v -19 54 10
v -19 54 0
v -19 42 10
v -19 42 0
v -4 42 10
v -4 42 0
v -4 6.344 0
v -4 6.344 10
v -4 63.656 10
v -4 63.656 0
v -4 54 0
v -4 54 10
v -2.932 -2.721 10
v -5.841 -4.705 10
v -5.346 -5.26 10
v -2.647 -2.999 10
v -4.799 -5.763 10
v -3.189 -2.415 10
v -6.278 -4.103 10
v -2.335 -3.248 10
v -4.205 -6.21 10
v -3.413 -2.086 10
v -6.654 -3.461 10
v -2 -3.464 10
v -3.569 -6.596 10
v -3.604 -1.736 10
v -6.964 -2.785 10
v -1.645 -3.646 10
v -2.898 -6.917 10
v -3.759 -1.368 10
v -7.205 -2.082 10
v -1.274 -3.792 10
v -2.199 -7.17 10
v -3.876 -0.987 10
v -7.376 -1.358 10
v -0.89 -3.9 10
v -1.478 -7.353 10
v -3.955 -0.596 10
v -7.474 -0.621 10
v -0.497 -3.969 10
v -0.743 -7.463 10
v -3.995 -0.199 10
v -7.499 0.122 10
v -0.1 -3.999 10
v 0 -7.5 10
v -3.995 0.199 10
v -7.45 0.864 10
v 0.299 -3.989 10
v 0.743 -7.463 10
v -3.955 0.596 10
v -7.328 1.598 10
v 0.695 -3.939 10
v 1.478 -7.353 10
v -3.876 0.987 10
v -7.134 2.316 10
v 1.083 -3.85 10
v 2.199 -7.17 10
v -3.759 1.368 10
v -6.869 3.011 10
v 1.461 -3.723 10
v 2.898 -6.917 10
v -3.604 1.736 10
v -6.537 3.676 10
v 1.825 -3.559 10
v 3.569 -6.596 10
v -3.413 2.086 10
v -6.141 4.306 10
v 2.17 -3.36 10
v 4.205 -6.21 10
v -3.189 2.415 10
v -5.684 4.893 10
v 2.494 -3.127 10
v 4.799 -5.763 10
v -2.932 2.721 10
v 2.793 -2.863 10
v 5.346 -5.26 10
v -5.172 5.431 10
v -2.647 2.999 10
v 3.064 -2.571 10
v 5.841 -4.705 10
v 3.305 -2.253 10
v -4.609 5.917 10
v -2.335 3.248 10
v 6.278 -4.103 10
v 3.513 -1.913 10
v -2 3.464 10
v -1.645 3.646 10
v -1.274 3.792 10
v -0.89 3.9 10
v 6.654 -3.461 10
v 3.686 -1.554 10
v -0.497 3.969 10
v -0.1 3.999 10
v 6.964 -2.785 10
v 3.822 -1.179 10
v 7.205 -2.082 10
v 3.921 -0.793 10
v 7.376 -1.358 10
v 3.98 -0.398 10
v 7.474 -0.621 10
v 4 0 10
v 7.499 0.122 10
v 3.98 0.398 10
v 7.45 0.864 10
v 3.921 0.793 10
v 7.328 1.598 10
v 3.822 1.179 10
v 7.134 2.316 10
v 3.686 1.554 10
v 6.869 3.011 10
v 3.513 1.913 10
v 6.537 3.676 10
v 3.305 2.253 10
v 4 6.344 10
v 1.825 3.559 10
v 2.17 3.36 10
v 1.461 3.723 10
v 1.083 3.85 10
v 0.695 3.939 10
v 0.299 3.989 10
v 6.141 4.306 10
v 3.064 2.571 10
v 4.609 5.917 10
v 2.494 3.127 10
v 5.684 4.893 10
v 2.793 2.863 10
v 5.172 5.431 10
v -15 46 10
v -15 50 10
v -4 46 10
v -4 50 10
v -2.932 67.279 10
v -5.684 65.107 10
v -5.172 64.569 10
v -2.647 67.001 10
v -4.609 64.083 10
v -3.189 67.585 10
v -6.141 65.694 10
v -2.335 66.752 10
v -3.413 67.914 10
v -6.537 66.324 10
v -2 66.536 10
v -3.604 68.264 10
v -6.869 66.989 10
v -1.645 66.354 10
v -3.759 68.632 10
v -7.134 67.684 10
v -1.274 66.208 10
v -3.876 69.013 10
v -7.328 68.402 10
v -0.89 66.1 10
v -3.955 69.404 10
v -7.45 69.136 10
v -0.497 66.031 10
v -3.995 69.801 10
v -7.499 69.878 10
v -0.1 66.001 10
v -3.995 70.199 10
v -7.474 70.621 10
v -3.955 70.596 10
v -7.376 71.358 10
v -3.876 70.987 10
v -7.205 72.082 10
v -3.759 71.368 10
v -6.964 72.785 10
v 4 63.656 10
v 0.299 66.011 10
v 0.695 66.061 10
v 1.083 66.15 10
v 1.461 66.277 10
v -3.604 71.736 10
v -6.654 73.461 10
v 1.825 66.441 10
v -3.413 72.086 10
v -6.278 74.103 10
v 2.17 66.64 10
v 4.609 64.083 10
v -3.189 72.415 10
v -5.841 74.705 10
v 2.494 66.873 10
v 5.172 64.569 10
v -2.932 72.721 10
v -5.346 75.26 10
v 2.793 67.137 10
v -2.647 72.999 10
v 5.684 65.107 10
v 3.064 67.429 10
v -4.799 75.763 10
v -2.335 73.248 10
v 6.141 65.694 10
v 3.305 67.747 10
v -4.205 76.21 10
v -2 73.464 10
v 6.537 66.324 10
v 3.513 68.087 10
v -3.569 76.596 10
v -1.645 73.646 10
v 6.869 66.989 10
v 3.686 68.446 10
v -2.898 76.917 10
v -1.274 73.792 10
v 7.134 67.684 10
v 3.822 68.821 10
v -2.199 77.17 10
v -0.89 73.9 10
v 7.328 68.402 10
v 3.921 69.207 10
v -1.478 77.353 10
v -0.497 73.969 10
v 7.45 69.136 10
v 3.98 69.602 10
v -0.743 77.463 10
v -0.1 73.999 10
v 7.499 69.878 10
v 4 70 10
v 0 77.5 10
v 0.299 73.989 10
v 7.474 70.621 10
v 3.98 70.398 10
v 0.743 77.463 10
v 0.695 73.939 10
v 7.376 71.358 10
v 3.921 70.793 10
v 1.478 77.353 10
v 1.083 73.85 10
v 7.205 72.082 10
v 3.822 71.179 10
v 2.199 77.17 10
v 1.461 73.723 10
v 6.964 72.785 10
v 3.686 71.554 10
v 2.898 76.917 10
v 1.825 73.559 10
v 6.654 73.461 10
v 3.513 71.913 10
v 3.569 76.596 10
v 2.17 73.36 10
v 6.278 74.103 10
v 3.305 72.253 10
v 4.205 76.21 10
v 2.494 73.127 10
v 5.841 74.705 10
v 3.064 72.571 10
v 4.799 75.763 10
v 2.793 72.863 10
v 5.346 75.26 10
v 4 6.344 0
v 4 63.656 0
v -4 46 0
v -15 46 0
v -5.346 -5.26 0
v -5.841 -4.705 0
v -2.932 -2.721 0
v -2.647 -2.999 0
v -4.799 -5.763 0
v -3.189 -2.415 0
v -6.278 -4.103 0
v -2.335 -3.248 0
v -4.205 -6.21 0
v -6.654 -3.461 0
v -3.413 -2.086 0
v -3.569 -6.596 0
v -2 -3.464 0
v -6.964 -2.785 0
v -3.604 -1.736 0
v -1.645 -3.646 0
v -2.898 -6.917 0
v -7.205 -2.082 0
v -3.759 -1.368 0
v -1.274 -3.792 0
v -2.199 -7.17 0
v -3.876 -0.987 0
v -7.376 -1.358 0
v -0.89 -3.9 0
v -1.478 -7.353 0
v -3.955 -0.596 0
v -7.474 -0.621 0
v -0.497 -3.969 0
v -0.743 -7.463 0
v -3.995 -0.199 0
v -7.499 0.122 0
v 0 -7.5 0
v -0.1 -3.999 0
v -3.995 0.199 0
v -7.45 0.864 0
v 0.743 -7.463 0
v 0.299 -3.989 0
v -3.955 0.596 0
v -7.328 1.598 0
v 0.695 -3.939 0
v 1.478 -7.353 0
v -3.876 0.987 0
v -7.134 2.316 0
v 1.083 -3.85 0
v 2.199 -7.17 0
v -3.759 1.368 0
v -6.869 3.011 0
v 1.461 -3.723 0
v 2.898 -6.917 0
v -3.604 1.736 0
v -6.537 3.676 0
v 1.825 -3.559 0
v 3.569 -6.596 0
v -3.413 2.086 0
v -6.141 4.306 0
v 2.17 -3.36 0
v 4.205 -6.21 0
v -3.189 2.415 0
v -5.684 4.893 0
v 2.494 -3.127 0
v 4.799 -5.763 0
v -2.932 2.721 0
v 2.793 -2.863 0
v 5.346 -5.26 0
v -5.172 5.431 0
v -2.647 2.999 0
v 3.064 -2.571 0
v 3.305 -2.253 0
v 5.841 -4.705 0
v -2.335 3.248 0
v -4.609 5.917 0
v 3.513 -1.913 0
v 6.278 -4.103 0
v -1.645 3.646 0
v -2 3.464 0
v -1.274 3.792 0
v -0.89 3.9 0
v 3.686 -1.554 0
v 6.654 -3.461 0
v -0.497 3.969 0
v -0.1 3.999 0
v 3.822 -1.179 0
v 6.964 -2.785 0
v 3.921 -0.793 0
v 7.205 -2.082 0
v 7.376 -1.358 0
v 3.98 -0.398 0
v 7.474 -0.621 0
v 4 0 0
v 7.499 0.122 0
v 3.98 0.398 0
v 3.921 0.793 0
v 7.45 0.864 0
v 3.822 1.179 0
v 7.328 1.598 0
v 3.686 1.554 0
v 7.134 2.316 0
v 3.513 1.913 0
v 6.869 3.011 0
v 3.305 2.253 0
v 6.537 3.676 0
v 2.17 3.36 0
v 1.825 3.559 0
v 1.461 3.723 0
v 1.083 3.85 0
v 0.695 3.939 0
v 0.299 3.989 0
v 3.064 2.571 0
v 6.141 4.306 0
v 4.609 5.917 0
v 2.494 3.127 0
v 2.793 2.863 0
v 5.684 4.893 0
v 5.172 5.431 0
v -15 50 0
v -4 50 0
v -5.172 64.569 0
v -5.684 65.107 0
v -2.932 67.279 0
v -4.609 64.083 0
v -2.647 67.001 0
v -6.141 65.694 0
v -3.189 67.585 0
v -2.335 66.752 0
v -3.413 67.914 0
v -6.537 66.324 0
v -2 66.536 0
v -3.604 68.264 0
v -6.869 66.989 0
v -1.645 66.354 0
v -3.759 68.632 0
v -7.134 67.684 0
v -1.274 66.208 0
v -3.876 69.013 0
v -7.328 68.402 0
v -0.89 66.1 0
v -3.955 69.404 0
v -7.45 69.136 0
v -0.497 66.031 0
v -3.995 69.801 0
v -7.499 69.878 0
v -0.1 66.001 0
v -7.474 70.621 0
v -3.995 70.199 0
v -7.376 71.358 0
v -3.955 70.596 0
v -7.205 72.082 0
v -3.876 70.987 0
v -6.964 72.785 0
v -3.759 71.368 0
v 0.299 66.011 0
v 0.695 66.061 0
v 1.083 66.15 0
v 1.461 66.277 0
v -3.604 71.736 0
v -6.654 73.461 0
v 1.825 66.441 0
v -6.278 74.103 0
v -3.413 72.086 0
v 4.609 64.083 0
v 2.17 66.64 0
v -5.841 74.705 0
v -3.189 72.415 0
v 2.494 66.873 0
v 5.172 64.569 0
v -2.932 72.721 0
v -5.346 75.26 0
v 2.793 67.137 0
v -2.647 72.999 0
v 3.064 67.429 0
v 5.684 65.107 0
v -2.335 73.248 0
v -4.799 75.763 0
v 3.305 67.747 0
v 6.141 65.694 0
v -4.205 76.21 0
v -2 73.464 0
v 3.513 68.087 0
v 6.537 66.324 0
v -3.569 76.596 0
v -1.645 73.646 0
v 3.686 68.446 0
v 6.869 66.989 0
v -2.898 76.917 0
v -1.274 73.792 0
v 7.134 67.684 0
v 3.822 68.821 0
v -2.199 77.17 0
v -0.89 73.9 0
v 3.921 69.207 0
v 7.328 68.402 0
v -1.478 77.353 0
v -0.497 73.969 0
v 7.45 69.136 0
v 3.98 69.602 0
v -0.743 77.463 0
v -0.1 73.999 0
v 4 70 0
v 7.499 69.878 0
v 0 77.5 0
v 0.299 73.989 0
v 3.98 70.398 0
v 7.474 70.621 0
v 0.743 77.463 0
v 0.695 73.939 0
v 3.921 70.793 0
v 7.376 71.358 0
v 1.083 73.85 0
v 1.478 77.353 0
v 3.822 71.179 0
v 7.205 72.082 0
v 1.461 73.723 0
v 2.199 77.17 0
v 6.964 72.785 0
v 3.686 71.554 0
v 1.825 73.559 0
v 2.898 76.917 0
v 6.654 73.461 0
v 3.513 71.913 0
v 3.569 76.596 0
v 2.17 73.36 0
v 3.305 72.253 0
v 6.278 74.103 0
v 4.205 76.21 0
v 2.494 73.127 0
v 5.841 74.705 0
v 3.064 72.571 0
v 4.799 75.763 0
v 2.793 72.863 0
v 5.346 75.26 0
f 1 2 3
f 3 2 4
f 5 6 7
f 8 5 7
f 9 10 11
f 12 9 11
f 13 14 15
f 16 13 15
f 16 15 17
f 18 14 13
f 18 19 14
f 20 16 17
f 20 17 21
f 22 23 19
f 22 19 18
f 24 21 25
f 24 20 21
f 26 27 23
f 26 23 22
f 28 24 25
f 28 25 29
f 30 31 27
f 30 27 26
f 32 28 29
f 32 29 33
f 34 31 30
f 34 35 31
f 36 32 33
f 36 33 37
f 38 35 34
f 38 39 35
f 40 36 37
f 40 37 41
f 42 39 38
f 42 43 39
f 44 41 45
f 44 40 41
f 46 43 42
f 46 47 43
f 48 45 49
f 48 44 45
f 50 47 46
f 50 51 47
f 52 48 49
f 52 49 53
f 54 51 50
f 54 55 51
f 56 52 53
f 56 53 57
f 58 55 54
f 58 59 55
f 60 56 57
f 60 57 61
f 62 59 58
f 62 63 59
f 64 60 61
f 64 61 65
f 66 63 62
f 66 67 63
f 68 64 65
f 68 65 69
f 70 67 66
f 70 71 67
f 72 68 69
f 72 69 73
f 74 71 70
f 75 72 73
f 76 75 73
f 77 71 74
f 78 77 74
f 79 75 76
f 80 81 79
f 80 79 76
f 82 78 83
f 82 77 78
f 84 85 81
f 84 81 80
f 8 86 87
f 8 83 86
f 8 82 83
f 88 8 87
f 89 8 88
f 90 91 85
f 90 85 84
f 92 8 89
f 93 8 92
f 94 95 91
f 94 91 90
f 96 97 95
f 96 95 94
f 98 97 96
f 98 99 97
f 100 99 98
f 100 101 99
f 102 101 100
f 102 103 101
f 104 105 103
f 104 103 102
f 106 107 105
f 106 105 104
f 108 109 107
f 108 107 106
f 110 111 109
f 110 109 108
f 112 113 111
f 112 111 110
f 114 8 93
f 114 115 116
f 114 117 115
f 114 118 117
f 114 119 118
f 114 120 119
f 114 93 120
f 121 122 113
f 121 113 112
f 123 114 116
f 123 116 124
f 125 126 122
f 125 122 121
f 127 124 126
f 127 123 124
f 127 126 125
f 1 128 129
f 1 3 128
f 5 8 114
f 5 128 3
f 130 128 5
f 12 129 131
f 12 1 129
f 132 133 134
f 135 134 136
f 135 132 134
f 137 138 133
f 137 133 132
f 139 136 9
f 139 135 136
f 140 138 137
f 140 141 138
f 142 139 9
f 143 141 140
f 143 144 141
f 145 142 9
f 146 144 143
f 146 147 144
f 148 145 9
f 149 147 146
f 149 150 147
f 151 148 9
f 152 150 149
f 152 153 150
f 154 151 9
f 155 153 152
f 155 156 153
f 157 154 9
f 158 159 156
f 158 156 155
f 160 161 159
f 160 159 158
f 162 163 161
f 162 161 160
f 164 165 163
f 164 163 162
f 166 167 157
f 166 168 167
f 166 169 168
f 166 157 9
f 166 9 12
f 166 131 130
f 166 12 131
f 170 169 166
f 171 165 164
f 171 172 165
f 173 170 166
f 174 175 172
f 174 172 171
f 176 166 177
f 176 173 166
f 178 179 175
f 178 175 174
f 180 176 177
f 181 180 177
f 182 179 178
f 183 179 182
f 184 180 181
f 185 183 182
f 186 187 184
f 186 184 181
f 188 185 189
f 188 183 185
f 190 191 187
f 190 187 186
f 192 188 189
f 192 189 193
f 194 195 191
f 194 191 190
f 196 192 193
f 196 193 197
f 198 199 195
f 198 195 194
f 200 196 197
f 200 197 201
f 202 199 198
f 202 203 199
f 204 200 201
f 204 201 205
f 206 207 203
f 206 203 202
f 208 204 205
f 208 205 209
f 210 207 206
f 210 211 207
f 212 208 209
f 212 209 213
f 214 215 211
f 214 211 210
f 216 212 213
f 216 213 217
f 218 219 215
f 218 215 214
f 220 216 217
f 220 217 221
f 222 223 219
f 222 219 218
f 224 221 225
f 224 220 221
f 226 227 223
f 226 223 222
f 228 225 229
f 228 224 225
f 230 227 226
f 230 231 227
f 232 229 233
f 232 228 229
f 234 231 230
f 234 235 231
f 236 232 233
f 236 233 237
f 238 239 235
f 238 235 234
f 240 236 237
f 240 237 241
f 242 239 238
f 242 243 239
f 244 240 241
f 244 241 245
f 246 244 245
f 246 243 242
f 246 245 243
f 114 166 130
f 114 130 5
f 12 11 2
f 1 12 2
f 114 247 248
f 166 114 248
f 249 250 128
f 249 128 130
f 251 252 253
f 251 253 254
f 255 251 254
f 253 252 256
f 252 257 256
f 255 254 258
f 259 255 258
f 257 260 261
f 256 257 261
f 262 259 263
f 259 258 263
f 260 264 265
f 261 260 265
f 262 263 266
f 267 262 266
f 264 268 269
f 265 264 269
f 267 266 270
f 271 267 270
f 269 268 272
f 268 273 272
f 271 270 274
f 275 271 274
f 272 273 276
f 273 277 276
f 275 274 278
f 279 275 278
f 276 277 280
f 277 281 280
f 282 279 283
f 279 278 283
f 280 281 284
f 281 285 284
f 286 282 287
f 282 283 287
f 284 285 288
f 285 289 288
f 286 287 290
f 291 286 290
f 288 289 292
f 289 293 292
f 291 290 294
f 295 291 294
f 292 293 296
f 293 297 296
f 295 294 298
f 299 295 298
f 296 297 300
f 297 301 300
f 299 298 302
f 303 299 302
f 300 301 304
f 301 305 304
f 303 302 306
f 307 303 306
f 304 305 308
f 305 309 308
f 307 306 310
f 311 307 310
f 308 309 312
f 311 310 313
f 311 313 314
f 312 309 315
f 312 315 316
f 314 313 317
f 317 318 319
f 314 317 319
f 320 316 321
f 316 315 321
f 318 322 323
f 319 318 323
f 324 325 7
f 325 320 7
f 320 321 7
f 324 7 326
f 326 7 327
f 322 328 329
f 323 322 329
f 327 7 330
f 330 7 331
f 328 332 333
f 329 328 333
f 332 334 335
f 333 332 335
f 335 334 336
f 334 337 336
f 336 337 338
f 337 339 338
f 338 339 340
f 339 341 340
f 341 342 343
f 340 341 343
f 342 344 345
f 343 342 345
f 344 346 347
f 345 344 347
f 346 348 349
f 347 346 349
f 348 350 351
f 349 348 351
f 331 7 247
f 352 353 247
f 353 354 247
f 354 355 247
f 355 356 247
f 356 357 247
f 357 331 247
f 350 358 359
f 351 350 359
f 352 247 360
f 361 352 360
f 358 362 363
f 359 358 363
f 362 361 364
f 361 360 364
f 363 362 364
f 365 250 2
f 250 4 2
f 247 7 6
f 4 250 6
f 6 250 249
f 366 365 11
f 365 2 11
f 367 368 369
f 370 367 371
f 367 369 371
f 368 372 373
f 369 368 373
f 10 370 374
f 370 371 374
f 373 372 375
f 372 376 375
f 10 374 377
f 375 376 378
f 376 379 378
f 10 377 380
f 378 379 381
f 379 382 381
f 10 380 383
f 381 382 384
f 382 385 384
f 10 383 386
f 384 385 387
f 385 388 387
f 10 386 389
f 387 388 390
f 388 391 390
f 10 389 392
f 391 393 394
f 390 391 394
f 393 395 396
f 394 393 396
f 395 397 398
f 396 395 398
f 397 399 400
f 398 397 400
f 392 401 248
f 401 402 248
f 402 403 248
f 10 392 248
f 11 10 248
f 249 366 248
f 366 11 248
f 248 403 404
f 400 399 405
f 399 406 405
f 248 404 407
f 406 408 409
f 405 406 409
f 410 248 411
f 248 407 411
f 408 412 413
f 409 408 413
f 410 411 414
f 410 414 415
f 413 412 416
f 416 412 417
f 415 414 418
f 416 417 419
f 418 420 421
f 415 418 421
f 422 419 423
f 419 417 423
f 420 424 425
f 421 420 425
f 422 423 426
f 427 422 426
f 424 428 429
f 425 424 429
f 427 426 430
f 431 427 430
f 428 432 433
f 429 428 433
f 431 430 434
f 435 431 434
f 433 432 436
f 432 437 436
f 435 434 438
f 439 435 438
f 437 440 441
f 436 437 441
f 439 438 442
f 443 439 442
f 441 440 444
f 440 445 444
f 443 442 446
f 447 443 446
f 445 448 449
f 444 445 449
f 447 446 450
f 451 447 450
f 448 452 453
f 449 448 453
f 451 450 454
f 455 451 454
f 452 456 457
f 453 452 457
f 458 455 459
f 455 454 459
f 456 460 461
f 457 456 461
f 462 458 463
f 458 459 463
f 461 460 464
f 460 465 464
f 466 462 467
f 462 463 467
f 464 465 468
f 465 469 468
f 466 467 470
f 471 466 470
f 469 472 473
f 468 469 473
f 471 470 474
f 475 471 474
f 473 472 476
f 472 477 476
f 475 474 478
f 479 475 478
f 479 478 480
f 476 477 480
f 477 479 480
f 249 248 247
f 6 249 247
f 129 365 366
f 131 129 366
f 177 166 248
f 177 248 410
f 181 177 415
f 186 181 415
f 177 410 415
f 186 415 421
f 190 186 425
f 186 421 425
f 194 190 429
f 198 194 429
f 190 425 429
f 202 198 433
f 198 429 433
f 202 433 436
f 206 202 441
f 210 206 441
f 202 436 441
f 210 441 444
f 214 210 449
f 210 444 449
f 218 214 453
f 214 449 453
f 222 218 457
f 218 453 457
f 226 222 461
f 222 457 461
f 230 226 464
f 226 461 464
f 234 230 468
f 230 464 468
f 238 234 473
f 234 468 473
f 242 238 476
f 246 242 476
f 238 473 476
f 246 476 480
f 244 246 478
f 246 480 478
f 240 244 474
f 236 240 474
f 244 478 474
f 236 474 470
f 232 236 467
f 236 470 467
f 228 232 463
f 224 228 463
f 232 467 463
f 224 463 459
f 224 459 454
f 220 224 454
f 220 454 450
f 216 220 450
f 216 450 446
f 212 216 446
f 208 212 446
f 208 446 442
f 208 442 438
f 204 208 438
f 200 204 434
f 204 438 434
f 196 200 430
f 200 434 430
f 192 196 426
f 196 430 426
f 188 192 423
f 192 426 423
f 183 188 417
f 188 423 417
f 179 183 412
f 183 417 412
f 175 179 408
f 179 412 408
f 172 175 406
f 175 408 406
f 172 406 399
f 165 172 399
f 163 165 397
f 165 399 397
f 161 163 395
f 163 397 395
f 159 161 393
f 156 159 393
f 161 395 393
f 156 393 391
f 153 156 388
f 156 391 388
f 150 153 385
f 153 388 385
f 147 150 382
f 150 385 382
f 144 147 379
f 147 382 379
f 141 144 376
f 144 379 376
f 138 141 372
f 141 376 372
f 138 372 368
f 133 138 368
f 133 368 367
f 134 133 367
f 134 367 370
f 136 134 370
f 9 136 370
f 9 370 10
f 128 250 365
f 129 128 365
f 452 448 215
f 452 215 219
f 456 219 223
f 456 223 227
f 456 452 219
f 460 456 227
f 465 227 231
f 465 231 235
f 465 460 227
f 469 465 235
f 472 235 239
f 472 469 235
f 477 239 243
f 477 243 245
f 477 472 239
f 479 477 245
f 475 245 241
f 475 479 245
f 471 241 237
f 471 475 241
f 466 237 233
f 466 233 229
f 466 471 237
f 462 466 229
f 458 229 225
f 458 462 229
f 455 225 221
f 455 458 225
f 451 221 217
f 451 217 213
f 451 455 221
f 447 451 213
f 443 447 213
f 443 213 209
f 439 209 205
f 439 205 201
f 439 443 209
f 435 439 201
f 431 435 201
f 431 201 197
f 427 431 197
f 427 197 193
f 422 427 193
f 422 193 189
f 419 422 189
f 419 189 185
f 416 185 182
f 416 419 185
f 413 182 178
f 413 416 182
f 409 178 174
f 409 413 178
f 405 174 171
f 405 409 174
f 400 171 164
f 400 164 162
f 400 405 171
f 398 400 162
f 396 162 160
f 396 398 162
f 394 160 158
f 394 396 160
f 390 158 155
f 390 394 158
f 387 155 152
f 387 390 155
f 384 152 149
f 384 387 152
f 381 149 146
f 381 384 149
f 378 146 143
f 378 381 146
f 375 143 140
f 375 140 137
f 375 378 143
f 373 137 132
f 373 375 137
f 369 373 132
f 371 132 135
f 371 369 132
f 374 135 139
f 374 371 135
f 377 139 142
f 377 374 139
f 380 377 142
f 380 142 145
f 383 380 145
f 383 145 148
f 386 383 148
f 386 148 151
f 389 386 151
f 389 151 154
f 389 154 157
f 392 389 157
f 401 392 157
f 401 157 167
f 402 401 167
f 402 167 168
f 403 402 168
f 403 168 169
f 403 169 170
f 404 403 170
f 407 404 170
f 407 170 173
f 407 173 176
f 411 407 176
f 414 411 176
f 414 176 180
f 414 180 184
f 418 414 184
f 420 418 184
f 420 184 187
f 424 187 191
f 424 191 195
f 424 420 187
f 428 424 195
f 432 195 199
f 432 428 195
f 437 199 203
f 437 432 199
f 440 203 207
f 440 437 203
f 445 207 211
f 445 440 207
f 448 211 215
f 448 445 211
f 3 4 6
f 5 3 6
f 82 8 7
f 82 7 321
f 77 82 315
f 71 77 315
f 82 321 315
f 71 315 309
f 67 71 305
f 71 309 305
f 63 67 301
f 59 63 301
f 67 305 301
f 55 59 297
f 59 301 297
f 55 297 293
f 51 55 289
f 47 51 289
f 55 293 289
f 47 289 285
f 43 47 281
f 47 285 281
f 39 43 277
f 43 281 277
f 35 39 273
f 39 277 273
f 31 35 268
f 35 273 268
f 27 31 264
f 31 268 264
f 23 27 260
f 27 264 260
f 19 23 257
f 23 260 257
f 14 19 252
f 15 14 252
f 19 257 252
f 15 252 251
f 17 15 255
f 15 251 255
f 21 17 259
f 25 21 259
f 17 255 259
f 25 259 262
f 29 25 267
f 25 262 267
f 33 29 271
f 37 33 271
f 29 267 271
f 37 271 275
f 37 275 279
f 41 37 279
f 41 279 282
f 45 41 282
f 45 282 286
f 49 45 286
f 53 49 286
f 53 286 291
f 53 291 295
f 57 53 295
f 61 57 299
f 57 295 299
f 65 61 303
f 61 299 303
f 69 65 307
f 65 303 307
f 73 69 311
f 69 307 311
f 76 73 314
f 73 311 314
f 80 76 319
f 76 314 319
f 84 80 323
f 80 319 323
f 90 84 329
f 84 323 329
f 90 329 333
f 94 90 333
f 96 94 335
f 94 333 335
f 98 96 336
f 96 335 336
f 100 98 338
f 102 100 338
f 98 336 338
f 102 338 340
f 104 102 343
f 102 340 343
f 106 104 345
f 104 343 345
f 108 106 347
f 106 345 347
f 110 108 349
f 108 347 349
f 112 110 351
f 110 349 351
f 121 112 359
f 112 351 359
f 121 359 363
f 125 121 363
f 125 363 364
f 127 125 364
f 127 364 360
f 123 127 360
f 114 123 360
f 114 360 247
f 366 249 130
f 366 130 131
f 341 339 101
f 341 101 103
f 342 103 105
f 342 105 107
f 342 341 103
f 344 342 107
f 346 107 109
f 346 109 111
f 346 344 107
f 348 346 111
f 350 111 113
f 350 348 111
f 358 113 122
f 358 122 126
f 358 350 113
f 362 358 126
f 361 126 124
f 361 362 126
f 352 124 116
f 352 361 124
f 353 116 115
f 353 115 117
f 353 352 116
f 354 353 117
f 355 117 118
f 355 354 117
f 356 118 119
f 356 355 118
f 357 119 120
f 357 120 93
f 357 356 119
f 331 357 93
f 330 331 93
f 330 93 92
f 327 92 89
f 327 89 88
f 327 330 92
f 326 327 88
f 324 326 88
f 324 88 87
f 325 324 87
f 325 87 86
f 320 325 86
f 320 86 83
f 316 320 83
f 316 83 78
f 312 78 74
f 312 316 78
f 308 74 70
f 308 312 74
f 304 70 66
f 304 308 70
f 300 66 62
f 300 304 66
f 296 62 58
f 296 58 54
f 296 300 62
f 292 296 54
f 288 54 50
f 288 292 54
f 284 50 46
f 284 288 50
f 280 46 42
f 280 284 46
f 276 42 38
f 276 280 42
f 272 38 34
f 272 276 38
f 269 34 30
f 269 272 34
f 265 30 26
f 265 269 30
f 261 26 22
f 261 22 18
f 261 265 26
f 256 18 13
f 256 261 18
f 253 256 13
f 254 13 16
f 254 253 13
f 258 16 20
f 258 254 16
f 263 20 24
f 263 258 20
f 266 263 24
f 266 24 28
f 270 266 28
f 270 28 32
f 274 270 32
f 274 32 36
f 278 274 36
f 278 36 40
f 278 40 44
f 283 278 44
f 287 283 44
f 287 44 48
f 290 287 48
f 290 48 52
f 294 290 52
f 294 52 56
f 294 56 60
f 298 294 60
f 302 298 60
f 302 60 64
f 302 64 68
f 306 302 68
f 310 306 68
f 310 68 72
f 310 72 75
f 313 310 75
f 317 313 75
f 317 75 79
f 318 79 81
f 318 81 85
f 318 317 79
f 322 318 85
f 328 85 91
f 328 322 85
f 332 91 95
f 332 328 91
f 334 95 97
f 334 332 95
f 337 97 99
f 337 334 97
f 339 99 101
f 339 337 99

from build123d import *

# Parameters (mm, degrees)
ESBO_O1_R                = 4
ESBO_O1_W                = 11
ESBO_O1_H                = 4
RESSALTO_EXTRUS_O1_DEPTH = 10


with BuildPart() as part:
    # Esboço1 → Ressalto-extrusão1 (new body)
    with BuildSketch(Plane.XY):
        with BuildLine():
            Line((4, 6.34428877), (4, 63.65571123))
            ThreePointArc((4, 63.65571123), (0, 77.5), (-4, 63.65571123))
            Line((-4, 63.65571123), (-4, 54))
            Line((-4, 54), (-19, 54))
            Line((-19, 54), (-19, 42))
            Line((-19, 42), (-4, 42))
            Line((-4, 42), (-4, 6.34428877))
            ThreePointArc((-4, 6.34428877), (0, -7.5), (4, 6.34428877))
        make_face()
        Circle(ESBO_O1_R, mode=Mode.SUBTRACT)
        with Locations((-9.5, 48)):
            Rectangle(ESBO_O1_W, ESBO_O1_H, mode=Mode.SUBTRACT)
        with Locations((0, 70)):
            Circle(ESBO_O1_R, mode=Mode.SUBTRACT)
    extrude(amount=RESSALTO_EXTRUS_O1_DEPTH)


solid = part.part
